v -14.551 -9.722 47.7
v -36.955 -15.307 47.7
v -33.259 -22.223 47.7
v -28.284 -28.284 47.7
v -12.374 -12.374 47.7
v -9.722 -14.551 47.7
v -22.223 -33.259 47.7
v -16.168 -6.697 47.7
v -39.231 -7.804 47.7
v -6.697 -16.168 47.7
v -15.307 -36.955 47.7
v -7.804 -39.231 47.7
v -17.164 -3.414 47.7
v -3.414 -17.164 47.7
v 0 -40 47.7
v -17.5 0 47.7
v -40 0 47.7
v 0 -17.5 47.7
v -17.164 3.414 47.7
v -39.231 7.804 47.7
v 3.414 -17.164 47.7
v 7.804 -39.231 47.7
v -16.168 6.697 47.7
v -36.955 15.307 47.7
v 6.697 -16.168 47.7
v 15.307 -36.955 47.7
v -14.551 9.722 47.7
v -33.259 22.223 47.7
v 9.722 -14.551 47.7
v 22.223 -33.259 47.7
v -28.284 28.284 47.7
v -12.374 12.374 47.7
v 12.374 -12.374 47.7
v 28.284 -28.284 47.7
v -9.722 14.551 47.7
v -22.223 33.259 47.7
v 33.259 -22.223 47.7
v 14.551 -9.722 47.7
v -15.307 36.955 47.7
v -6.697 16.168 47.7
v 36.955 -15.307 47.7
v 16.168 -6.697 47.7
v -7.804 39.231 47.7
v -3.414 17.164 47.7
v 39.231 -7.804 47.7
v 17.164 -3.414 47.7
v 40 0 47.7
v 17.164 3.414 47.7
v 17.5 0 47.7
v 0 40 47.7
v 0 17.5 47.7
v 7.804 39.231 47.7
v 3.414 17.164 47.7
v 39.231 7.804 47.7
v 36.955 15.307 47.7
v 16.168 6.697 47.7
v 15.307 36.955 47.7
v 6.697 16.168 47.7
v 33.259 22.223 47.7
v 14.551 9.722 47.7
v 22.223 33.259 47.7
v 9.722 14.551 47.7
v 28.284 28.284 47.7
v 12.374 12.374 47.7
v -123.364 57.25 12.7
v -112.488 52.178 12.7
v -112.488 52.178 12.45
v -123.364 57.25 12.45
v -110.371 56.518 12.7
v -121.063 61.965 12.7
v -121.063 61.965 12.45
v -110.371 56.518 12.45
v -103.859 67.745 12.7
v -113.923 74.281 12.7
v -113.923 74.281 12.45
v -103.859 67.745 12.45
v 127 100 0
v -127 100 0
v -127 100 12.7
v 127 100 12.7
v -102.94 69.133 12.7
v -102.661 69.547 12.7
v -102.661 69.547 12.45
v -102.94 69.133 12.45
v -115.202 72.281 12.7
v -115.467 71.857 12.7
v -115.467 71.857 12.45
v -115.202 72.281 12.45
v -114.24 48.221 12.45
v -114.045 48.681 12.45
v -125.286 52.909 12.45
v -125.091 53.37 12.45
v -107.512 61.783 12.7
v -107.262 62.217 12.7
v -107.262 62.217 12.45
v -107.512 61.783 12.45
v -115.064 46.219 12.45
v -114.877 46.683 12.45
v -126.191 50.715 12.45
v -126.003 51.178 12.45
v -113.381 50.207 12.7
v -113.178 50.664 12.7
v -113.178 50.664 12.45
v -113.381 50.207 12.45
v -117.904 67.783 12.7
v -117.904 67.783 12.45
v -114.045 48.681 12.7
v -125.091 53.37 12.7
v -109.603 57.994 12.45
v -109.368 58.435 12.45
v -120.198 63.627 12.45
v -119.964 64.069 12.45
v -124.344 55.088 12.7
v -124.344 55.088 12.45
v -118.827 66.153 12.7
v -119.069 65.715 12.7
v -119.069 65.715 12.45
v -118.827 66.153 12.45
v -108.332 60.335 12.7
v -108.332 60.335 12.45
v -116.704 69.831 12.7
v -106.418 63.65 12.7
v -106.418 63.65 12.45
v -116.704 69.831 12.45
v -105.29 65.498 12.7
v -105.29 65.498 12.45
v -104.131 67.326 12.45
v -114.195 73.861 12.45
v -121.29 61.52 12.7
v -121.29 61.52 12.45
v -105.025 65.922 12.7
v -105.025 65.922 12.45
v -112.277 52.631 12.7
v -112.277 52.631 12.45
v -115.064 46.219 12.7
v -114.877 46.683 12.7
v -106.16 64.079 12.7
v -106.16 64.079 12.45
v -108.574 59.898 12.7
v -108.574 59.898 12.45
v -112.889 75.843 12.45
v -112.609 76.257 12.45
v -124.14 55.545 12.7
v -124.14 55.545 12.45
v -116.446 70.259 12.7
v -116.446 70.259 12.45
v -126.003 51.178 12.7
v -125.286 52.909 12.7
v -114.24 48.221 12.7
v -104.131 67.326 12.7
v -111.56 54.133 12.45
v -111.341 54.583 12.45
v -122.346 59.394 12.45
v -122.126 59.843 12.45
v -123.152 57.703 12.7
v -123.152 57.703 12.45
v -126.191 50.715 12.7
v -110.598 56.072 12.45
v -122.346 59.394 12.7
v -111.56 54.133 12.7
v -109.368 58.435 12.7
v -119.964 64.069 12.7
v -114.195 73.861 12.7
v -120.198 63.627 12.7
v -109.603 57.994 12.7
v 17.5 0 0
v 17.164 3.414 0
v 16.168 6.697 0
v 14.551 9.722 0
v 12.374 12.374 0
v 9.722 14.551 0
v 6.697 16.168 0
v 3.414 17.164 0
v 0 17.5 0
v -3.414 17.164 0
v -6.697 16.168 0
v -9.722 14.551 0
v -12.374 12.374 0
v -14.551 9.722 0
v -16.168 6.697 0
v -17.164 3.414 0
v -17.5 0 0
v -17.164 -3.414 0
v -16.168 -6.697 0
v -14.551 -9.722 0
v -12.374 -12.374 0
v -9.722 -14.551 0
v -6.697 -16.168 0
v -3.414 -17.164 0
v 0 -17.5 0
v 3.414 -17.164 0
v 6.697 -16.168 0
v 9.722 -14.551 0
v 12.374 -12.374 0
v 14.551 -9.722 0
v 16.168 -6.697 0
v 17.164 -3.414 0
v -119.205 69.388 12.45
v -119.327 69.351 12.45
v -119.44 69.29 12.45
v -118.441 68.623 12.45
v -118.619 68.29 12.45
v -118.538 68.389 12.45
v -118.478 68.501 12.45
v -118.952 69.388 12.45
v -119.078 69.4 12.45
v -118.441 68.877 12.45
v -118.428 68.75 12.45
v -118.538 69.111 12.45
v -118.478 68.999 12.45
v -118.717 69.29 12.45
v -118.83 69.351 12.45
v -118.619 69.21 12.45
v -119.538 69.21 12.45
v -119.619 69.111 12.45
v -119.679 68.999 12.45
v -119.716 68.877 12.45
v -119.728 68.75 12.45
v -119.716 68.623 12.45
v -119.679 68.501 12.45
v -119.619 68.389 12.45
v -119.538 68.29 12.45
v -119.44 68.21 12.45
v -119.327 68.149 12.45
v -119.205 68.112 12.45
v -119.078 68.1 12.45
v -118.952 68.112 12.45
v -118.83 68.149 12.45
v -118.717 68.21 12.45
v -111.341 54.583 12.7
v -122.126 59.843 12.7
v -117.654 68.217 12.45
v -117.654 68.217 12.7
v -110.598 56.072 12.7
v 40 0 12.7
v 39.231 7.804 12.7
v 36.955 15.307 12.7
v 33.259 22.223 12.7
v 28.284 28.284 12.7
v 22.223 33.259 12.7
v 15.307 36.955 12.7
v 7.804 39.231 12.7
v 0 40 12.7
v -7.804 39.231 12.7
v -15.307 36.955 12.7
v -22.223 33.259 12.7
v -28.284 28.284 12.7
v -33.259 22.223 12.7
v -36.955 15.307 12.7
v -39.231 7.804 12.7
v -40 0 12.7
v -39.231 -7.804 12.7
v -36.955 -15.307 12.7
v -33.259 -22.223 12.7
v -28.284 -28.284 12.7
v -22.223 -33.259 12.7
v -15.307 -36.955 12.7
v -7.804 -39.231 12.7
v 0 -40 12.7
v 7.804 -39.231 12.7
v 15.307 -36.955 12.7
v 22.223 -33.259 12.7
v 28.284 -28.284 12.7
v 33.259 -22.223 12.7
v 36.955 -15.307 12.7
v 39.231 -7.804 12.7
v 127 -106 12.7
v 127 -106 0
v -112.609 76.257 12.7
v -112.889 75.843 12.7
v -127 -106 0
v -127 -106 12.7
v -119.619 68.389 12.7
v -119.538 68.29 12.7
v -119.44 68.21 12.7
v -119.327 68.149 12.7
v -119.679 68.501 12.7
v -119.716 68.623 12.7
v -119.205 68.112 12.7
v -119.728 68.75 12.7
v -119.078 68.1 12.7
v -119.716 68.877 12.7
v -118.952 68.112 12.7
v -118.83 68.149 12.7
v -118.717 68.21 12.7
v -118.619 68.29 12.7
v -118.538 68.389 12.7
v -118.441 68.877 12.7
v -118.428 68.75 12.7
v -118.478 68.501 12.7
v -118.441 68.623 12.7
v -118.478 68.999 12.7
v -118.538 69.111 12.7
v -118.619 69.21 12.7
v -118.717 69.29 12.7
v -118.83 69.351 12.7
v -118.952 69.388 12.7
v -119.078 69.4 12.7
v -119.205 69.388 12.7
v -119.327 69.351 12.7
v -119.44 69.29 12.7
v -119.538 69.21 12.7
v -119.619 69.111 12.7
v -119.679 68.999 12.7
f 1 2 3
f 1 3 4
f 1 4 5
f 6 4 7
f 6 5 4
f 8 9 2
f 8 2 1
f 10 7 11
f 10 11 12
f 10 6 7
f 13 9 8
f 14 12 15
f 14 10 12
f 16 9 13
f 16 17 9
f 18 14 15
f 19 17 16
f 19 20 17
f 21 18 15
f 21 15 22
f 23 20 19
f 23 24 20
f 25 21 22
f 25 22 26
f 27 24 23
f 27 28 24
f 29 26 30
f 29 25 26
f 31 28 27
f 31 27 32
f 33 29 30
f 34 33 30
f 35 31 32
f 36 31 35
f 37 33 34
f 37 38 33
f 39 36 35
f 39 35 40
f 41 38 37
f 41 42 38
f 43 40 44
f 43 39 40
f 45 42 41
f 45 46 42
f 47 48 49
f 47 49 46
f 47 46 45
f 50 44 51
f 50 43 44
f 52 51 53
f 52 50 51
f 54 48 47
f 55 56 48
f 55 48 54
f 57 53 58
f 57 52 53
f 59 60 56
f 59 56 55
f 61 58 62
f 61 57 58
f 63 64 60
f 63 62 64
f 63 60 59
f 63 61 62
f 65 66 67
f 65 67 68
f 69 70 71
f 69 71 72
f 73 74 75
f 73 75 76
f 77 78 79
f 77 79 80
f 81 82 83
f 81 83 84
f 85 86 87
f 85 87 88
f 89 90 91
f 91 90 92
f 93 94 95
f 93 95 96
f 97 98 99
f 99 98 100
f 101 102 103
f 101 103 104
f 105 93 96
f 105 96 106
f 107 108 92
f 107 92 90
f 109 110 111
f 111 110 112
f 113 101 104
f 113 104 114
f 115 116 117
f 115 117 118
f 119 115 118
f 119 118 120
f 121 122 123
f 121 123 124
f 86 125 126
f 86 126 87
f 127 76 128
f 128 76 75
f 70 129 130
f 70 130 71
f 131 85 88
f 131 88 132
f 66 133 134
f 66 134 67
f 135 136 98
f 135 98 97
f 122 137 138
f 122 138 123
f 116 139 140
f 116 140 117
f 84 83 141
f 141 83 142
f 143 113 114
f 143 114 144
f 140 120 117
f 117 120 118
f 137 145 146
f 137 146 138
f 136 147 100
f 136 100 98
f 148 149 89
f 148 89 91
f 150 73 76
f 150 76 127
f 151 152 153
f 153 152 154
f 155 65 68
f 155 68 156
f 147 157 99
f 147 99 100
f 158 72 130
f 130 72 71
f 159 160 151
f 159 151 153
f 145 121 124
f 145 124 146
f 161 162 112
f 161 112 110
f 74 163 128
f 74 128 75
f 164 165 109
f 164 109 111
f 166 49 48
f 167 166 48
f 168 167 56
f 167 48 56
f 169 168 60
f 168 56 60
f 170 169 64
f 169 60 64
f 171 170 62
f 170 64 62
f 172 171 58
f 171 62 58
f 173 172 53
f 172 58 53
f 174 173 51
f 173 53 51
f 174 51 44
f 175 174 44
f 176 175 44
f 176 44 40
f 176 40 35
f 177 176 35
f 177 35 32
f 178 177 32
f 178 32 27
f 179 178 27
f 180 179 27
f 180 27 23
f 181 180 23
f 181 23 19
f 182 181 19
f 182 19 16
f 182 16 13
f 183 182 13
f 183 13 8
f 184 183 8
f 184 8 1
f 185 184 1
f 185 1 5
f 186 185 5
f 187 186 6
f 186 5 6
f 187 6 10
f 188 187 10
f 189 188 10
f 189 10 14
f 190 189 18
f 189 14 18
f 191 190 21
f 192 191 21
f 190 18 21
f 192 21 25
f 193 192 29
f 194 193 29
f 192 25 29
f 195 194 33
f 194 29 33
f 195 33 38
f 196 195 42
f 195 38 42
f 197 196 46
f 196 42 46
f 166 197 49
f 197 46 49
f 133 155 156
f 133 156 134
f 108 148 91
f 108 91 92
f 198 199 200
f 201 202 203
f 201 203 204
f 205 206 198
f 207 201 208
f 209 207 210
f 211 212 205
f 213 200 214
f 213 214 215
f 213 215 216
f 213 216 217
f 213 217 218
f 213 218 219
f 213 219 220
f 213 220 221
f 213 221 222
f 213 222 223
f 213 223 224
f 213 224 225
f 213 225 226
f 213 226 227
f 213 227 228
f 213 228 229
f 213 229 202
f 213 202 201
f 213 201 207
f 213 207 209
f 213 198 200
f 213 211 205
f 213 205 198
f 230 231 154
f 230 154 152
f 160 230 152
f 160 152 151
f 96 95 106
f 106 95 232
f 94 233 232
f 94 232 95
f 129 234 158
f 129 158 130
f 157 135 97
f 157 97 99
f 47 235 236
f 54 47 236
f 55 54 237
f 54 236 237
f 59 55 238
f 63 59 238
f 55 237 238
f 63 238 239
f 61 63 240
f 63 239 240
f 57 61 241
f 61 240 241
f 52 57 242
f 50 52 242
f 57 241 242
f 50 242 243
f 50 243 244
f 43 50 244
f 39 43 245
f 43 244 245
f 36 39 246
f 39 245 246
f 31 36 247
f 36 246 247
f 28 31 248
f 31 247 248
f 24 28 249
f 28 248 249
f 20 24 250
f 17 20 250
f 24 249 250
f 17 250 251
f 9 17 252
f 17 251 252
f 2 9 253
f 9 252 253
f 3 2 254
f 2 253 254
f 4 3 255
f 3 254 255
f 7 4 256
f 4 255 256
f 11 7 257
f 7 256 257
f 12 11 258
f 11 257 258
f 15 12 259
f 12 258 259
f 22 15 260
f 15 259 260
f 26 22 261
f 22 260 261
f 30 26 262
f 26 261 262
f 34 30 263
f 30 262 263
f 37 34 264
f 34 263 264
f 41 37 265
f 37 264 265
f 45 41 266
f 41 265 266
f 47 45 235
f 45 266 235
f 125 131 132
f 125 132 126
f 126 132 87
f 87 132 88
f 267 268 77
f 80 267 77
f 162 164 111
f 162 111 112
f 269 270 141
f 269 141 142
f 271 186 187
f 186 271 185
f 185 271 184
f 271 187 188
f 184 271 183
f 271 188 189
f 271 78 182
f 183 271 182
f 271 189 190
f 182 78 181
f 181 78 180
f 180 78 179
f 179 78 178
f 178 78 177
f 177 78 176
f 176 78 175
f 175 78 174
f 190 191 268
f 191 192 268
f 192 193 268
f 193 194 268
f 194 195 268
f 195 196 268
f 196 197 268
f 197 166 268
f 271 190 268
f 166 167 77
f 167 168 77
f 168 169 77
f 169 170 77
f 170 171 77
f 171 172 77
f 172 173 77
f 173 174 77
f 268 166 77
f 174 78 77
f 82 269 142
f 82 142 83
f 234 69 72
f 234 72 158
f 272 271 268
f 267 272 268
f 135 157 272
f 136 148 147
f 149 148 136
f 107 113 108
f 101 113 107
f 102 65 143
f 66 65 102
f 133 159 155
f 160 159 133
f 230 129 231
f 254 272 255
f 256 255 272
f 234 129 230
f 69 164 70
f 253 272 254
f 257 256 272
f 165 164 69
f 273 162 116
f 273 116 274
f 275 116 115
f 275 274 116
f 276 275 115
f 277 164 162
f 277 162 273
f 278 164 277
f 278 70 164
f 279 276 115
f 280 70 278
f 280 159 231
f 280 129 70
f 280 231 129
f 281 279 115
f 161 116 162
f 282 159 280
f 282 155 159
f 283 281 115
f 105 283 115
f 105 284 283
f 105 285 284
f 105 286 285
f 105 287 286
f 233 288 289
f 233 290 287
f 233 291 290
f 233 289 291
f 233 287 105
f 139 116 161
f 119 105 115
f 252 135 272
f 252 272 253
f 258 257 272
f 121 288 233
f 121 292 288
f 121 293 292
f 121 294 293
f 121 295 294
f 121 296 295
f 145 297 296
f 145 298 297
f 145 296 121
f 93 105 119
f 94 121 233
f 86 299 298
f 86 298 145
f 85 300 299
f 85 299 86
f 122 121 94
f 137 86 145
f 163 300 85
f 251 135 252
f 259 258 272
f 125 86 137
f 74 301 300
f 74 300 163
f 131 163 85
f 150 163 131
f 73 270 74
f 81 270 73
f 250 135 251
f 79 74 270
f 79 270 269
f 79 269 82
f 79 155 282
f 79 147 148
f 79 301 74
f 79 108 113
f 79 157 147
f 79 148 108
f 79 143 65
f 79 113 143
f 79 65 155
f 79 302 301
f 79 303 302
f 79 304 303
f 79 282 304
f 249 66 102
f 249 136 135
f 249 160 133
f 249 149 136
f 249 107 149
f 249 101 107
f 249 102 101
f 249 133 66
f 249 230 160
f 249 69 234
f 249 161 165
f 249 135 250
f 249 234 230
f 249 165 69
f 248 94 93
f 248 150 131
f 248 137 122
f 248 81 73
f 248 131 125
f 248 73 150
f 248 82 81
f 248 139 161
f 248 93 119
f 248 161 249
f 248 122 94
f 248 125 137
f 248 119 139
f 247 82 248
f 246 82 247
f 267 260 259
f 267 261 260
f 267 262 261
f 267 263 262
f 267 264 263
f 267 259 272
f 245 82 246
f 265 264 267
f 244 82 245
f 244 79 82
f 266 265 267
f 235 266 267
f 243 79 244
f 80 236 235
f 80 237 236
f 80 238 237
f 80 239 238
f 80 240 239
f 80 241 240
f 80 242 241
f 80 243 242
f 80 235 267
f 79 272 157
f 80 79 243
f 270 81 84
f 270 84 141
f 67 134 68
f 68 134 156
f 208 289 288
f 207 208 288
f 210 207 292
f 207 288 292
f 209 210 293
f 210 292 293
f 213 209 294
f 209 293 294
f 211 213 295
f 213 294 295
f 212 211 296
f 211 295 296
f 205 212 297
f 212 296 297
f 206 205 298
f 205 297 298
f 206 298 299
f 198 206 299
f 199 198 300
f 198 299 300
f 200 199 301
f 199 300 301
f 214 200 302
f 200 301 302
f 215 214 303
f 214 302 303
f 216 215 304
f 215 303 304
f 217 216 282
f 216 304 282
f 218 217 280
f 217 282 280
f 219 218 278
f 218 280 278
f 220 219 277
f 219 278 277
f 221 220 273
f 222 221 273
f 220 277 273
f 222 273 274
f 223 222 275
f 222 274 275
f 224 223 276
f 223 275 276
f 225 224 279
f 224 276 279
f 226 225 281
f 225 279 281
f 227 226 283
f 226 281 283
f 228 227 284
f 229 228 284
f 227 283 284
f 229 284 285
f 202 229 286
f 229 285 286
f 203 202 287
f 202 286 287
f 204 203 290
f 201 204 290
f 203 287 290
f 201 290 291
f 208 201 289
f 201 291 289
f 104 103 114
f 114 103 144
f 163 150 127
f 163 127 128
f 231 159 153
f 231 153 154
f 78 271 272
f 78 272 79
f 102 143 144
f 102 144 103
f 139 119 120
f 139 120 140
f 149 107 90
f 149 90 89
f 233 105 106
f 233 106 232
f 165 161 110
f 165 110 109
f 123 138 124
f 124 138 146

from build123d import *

# Parameters (mm, degrees)
SKETCH1_W         = 254
SKETCH1_H         = 206
BODY_DEPTH        = 12.7
SKETCH2_R         = 40
SPIGOT_DEPTH      = 35
SKETCH3_R         = 17.5
HOLE_DEPTH        = 48.7
SLIT_DEPTH        = 0.25
RIGHT_SLITS_COUNT = 5
RIGHT_SLITS_ANGLE = 4
LEFT_SLITS_COUNT  = 9
LEFT_SLITS_ANGLE  = 8
SKETCH7_R         = 0.65
TINY_HOLE_DEPTH   = 0.25


with BuildPart() as part:
    # Sketch1 → Body (new body)
    with BuildSketch(Plane.XY):
        with Locations((0, -3)):
            Rectangle(SKETCH1_W, SKETCH1_H)
    extrude(amount=BODY_DEPTH)

    # Sketch2 → Spigot (add)
    with BuildSketch(Plane.XY.offset(12.7)):
        Circle(SKETCH2_R)
    extrude(amount=SPIGOT_DEPTH)

    # Sketch3 → Hole (cut, through all)
    with BuildSketch(Plane.XY.offset(47.7)):
        Circle(SKETCH3_R)
    extrude(amount=-HOLE_DEPTH, mode=Mode.SUBTRACT)

    # Sketch4 → Slit (cut)
    with BuildSketch(Plane.XY.offset(12.7)):
        Polygon((-117.654454915, 68.216506351), (-107.262150069, 62.216506351), (-107.512150069, 61.783493649), (-117.904454915, 67.783493649), align=None)
    slit = extrude(amount=-SLIT_DEPTH, mode=Mode.SUBTRACT)

    # Right Slits: Slit ×5 about axis
    right_slits_axis = Axis((0, 0, 0), (0, 0, -1))
    for i in range(1, RIGHT_SLITS_COUNT):
        add(slit.rotate(right_slits_axis, i * RIGHT_SLITS_ANGLE / (RIGHT_SLITS_COUNT - 1)), mode=Mode.SUBTRACT)

    # Left Slits: Slit ×9 about axis
    left_slits_axis = Axis((0, 0, 0), (0, 0, 1))
    for i in range(1, LEFT_SLITS_COUNT):
        add(slit.rotate(left_slits_axis, i * LEFT_SLITS_ANGLE / (LEFT_SLITS_COUNT - 1)), mode=Mode.SUBTRACT)

    # Sketch7 → Tiny Hole (cut)
    with BuildSketch(Plane.XY.offset(12.7)):
        with Locations((-119.07849302, 68.75)):
            Circle(SKETCH7_R)
    extrude(amount=-TINY_HOLE_DEPTH, mode=Mode.SUBTRACT)


solid = part.part
